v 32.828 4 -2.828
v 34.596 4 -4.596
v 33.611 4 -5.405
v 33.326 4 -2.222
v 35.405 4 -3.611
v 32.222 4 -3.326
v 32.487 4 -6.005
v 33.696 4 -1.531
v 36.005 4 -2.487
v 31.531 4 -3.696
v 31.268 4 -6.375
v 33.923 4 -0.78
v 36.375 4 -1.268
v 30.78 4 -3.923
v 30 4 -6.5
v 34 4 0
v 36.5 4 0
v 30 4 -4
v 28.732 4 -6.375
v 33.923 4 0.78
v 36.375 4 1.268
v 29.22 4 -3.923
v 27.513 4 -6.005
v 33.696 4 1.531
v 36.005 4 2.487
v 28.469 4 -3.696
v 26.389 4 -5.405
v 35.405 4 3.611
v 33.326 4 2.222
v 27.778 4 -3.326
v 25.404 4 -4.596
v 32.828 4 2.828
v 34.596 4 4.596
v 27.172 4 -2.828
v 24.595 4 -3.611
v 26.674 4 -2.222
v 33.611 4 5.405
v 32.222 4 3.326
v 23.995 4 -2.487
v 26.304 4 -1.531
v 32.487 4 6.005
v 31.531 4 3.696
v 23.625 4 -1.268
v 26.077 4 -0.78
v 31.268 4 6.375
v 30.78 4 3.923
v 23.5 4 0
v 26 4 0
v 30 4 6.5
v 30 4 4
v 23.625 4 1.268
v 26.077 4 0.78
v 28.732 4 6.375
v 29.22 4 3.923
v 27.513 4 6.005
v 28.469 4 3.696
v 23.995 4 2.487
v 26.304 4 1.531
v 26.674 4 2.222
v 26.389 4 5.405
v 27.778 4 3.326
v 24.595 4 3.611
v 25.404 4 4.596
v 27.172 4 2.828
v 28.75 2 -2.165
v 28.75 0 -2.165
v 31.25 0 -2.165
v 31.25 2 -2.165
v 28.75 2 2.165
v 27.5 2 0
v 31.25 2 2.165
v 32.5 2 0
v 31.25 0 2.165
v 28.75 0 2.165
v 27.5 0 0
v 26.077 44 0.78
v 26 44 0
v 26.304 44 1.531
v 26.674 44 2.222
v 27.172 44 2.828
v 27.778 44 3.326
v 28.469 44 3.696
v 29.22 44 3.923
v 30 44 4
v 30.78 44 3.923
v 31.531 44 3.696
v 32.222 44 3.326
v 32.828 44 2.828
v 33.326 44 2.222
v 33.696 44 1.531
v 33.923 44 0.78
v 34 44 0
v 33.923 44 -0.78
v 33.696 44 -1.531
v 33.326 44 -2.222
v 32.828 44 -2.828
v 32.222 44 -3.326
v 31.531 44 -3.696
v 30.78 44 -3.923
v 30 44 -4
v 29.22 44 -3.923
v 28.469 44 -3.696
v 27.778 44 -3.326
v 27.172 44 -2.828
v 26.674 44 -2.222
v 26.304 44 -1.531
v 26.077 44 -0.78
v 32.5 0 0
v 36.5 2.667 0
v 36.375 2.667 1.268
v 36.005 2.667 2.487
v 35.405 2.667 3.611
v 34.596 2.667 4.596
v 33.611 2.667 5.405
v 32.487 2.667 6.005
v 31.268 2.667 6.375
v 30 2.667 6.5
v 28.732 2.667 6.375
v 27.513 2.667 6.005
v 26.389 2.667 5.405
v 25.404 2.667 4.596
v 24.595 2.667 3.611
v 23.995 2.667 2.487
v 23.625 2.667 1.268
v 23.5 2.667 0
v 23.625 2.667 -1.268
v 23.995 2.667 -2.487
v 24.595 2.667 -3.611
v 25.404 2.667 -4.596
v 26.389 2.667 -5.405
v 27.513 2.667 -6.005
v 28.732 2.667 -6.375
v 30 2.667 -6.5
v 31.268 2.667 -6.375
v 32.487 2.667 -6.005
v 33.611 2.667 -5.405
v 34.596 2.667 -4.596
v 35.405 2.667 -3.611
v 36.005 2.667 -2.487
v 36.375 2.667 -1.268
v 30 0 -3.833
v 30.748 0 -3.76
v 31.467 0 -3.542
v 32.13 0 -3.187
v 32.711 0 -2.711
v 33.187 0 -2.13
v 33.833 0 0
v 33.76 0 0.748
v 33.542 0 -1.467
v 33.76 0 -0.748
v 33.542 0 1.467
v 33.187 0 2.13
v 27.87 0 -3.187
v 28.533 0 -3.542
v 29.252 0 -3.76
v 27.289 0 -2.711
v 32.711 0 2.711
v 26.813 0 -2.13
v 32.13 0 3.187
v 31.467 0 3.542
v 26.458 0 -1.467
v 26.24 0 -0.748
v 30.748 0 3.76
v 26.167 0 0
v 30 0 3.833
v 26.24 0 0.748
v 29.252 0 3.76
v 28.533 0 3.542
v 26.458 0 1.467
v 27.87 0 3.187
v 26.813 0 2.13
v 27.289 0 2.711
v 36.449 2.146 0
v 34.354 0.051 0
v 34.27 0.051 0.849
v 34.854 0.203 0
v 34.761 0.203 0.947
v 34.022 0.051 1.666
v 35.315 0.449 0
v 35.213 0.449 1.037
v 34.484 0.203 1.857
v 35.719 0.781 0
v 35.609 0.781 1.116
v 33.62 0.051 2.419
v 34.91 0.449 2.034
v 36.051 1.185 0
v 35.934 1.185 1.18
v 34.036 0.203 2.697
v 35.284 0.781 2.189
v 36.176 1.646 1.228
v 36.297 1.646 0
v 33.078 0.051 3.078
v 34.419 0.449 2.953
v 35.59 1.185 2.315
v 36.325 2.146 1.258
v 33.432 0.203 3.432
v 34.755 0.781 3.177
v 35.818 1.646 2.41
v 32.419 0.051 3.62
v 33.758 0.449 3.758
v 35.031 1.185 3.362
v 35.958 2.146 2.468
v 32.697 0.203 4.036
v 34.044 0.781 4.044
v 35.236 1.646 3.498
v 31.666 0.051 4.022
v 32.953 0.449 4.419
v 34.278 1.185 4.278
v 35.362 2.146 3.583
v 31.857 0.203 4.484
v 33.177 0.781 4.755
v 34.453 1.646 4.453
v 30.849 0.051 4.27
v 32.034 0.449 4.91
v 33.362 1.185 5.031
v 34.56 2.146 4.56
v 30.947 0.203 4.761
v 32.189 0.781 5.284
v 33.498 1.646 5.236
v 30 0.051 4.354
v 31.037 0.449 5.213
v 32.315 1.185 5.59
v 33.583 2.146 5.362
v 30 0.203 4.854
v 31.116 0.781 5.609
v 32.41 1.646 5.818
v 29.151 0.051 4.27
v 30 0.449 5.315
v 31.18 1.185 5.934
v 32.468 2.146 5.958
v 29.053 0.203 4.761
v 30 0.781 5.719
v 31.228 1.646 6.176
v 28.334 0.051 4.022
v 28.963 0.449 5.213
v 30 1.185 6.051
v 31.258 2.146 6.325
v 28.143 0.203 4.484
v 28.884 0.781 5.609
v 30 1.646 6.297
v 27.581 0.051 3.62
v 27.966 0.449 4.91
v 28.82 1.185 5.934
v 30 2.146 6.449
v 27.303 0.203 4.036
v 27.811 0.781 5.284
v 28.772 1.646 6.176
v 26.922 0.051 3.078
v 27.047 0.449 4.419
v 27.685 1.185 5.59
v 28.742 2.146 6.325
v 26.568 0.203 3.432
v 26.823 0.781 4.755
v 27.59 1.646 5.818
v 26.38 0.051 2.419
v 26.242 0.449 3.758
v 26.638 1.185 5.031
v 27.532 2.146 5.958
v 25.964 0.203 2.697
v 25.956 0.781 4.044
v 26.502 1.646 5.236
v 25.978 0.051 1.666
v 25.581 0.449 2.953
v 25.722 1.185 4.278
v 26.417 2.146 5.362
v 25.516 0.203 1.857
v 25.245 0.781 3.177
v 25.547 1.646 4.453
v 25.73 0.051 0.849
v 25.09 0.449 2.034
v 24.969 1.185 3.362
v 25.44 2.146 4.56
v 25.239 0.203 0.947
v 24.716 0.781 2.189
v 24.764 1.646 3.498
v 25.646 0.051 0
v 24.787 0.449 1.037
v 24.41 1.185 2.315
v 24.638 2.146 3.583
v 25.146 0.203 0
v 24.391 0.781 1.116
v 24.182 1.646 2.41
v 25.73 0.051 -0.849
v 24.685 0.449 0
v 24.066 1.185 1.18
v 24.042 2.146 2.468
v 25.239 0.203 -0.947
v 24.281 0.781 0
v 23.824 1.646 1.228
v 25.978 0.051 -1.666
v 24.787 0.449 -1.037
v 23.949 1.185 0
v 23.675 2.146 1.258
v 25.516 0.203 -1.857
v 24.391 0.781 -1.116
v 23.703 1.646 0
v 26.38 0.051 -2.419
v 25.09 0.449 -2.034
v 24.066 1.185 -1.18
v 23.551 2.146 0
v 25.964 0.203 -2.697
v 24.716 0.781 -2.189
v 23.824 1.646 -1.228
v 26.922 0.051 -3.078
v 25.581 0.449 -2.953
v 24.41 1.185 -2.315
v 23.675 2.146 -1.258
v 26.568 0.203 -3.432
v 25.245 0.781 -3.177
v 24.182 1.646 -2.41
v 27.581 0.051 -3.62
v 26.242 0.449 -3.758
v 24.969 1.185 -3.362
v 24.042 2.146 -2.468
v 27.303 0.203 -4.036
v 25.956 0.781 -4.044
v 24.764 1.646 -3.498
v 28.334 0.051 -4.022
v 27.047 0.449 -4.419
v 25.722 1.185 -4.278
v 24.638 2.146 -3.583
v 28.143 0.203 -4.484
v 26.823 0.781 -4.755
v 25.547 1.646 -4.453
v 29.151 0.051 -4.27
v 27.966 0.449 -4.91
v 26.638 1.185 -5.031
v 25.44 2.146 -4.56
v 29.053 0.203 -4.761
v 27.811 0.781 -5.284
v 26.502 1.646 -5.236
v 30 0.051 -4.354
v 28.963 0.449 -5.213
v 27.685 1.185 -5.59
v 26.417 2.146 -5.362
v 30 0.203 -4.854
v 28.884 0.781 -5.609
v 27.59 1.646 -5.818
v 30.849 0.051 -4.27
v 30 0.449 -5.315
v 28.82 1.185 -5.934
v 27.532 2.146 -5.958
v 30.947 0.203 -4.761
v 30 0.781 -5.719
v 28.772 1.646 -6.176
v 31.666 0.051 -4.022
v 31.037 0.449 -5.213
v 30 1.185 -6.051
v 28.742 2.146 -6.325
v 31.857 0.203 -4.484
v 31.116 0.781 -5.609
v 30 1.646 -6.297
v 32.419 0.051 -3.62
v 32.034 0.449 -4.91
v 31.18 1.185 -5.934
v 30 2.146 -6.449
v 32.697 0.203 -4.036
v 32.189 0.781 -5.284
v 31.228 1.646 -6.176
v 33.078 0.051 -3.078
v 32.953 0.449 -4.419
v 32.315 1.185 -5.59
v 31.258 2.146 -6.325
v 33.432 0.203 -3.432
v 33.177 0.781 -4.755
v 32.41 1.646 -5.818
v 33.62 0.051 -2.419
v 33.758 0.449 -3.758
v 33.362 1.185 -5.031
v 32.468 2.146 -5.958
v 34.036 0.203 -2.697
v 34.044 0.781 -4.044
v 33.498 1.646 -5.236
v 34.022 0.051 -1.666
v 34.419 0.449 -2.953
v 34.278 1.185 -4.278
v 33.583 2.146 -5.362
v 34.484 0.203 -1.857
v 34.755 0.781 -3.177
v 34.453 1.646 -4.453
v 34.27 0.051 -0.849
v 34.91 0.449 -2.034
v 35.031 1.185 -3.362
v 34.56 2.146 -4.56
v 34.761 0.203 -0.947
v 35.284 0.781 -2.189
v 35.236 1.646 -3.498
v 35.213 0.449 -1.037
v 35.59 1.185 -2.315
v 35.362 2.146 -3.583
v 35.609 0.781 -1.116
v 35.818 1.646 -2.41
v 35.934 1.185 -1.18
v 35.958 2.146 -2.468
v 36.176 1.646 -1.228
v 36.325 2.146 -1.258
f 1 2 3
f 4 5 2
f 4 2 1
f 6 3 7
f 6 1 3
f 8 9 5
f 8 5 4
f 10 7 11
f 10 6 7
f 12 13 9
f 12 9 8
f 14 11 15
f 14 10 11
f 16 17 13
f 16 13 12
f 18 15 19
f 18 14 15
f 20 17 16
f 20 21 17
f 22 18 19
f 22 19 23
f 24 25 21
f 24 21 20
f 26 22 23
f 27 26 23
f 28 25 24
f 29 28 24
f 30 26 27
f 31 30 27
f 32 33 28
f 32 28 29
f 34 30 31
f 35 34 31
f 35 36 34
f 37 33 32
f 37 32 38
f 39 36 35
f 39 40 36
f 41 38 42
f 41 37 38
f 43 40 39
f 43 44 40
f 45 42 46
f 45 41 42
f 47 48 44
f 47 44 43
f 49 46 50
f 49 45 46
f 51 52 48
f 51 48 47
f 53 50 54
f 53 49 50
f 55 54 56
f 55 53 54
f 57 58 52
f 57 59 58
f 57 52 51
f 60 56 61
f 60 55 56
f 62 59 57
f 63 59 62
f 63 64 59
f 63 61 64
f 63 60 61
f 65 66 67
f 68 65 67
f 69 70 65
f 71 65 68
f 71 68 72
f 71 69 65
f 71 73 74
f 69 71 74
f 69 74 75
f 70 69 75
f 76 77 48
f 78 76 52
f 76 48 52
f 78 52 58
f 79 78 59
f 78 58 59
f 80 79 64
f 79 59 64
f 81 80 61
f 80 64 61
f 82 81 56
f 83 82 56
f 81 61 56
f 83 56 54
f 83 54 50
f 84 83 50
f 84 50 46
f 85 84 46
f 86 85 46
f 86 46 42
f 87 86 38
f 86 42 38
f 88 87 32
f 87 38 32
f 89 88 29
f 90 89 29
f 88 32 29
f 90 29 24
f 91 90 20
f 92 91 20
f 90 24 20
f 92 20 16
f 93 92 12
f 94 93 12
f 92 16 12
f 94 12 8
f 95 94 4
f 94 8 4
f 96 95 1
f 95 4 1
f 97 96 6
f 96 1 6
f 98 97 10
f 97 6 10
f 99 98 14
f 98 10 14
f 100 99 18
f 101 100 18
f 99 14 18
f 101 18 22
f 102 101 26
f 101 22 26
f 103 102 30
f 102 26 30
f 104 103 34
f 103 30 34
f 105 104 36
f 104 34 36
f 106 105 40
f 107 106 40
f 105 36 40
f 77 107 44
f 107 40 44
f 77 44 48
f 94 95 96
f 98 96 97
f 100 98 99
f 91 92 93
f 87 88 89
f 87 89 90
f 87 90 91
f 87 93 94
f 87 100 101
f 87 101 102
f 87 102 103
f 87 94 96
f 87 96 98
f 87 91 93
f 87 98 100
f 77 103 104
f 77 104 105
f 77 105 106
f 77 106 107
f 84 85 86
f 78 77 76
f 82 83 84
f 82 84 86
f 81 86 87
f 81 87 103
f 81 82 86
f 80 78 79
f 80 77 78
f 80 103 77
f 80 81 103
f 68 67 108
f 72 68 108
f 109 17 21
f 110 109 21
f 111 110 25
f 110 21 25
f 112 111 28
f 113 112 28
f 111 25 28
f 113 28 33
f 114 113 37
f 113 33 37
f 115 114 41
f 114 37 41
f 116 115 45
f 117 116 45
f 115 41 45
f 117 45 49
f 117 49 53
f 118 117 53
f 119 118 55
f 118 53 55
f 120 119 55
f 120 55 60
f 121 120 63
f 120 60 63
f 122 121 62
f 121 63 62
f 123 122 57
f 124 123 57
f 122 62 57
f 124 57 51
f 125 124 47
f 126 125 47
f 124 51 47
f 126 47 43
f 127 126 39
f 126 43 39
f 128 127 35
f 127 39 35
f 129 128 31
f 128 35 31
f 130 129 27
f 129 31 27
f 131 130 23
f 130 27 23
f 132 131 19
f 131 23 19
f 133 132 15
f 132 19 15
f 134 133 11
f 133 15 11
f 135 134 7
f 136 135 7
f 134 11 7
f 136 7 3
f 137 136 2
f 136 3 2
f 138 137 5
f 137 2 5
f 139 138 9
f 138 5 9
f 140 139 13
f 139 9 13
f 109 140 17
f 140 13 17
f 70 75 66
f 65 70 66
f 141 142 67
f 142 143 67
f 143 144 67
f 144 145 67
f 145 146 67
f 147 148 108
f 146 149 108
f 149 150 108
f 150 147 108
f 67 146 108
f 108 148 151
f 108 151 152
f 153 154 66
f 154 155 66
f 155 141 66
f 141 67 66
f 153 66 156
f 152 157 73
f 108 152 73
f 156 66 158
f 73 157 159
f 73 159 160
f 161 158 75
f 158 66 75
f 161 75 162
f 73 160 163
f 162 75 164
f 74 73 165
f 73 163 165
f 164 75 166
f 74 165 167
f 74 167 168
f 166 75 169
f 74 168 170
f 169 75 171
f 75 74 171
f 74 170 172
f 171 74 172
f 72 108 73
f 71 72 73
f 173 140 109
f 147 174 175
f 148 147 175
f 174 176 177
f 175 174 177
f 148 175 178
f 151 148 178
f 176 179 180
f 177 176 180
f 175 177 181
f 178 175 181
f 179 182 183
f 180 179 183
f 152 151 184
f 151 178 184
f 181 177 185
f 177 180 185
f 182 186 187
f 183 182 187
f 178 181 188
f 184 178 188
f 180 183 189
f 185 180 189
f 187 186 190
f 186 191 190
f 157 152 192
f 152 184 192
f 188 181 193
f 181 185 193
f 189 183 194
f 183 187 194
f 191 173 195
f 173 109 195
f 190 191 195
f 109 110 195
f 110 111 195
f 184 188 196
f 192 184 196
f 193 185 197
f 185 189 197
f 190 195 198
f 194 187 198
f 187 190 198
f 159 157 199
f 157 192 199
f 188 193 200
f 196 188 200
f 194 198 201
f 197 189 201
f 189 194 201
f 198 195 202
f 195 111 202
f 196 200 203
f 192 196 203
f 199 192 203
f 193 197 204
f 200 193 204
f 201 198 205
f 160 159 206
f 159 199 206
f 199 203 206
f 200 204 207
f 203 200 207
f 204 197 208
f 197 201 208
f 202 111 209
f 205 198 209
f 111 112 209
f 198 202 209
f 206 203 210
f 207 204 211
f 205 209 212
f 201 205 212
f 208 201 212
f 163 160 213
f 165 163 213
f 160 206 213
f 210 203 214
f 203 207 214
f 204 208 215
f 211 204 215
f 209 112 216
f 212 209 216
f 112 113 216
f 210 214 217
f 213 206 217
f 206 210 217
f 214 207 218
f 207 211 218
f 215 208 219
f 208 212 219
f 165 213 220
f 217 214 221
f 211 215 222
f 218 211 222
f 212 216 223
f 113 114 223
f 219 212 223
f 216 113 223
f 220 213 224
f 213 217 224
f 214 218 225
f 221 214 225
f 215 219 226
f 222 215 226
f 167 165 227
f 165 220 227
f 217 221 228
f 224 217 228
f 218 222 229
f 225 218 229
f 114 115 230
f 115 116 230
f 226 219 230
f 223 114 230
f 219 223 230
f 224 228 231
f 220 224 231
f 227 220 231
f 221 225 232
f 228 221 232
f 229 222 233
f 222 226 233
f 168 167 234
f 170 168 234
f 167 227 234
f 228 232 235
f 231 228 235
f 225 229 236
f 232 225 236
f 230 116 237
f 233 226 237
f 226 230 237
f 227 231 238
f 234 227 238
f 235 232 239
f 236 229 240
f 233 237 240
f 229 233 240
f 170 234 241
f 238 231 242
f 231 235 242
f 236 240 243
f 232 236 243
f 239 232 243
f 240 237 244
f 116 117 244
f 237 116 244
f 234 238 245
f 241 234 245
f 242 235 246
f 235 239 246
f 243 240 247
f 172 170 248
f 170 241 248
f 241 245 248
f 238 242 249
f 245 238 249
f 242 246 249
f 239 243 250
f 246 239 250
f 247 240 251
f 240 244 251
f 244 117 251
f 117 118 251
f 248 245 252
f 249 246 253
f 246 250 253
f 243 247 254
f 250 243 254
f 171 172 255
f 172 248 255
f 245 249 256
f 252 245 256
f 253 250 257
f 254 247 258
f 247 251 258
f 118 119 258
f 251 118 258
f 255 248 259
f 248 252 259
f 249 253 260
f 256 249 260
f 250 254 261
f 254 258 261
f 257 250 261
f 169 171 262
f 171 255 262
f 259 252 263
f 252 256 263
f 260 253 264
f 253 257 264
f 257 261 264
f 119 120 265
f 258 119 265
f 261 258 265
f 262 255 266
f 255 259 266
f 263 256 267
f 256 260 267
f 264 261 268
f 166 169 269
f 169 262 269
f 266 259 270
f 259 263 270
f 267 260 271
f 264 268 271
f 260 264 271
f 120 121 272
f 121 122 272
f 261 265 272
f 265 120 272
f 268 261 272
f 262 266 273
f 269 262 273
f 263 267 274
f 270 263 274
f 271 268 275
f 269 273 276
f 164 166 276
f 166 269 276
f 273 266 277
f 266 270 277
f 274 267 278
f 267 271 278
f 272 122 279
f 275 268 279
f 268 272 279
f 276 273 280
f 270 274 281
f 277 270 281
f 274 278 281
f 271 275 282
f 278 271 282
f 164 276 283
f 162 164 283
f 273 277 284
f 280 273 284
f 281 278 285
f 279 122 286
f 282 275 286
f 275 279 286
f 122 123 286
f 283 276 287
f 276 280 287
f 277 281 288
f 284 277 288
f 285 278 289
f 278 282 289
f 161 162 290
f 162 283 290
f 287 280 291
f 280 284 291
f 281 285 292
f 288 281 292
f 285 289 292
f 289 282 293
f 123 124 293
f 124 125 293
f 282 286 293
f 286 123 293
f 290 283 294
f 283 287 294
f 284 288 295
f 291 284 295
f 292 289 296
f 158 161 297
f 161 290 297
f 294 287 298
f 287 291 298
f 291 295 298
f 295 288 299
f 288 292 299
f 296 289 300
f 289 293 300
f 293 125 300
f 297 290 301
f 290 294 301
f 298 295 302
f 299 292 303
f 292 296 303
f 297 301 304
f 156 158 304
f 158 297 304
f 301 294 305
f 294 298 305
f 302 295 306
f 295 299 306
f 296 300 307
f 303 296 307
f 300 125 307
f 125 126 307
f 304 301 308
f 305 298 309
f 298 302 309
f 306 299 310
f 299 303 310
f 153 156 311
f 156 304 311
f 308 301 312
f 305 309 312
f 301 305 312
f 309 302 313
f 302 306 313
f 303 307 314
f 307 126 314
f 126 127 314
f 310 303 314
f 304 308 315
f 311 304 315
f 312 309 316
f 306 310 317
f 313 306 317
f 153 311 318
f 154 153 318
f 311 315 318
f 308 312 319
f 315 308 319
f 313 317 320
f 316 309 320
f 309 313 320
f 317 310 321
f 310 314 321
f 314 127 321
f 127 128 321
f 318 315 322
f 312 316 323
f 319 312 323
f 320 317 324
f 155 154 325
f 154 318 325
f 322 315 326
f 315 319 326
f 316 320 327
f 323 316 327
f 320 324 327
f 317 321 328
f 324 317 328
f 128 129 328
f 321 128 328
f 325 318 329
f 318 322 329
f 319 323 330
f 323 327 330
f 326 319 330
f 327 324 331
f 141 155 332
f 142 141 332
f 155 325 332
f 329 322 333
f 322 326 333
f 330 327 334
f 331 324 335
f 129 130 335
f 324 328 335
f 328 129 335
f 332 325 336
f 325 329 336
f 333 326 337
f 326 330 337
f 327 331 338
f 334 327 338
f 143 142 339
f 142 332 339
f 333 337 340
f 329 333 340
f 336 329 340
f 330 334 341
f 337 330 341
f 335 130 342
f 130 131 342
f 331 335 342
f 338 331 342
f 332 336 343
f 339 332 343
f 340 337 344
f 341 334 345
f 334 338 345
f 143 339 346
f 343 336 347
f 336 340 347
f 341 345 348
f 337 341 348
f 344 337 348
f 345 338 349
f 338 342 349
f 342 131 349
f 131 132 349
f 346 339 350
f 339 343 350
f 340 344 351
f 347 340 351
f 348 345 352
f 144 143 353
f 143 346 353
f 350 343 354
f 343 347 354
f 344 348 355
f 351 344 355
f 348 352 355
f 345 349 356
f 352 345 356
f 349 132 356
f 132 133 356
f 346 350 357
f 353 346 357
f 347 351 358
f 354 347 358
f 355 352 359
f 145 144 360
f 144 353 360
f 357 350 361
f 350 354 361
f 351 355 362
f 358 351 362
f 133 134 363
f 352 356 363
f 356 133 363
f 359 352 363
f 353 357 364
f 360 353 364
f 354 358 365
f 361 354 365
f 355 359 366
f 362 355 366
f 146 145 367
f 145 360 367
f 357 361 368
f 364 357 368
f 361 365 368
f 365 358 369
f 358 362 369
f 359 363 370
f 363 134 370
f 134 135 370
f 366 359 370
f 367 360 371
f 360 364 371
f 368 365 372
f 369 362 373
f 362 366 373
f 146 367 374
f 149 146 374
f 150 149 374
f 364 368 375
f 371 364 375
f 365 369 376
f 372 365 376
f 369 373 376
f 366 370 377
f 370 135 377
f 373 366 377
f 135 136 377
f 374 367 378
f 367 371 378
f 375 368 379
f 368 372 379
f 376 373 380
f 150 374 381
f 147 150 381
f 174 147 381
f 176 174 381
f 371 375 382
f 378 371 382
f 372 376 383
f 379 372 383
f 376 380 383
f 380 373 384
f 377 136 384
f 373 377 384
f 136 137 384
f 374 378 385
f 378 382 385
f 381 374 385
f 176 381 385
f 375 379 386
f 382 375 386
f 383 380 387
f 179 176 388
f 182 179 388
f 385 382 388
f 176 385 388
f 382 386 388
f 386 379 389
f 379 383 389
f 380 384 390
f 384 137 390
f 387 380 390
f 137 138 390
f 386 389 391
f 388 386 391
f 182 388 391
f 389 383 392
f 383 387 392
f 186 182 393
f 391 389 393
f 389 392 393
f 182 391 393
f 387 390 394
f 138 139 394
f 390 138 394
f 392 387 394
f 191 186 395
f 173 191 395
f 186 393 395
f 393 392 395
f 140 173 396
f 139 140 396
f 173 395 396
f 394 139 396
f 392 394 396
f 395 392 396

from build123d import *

# Parameters (mm, degrees)
SKETCH_1_W          = 6.5
SKETCH_1_H          = 4
SKETCH_2_R          = 4
EXTRUDE_1_DEPTH     = 40
CUT_EXTRUDE_1_DEPTH = 2
FILLET_1_R          = 2.666666667


with BuildPart() as part:
    # 草图1 → 旋转1 (revolve)
    with BuildSketch(Plane.XY):
        with Locations((33.25, 2)):
            Rectangle(SKETCH_1_W, SKETCH_1_H)
    revolve(axis=Axis((30, 4, 0), (0, -1, 0)))

    # 草图2 → 凸台-拉伸1 (add)
    with BuildSketch(Plane(origin=(0, 4, 0), x_dir=(-1, 0, 0), z_dir=(0, 1, 0))):
        with Locations((-30, 0)):
            Circle(SKETCH_2_R)
    extrude(amount=EXTRUDE_1_DEPTH)

    # 草图3 → 切除-拉伸1 (cut)
    with BuildSketch(Plane.XZ):
        Polygon((28.75, -2.165063509), (31.25, -2.165063509), (32.5, 0), (31.25, 2.165063509), (28.75, 2.165063509), (27.5, 0), align=None)
    extrude(amount=-CUT_EXTRUDE_1_DEPTH, mode=Mode.SUBTRACT)

    # 圆角1
    fillet_1_edges = [part.edges().sort_by_distance(p)[0] for p in [
        (23.5, 0, 0),
    ]]
    fillet(fillet_1_edges, radius=FILLET_1_R)


solid = part.part
